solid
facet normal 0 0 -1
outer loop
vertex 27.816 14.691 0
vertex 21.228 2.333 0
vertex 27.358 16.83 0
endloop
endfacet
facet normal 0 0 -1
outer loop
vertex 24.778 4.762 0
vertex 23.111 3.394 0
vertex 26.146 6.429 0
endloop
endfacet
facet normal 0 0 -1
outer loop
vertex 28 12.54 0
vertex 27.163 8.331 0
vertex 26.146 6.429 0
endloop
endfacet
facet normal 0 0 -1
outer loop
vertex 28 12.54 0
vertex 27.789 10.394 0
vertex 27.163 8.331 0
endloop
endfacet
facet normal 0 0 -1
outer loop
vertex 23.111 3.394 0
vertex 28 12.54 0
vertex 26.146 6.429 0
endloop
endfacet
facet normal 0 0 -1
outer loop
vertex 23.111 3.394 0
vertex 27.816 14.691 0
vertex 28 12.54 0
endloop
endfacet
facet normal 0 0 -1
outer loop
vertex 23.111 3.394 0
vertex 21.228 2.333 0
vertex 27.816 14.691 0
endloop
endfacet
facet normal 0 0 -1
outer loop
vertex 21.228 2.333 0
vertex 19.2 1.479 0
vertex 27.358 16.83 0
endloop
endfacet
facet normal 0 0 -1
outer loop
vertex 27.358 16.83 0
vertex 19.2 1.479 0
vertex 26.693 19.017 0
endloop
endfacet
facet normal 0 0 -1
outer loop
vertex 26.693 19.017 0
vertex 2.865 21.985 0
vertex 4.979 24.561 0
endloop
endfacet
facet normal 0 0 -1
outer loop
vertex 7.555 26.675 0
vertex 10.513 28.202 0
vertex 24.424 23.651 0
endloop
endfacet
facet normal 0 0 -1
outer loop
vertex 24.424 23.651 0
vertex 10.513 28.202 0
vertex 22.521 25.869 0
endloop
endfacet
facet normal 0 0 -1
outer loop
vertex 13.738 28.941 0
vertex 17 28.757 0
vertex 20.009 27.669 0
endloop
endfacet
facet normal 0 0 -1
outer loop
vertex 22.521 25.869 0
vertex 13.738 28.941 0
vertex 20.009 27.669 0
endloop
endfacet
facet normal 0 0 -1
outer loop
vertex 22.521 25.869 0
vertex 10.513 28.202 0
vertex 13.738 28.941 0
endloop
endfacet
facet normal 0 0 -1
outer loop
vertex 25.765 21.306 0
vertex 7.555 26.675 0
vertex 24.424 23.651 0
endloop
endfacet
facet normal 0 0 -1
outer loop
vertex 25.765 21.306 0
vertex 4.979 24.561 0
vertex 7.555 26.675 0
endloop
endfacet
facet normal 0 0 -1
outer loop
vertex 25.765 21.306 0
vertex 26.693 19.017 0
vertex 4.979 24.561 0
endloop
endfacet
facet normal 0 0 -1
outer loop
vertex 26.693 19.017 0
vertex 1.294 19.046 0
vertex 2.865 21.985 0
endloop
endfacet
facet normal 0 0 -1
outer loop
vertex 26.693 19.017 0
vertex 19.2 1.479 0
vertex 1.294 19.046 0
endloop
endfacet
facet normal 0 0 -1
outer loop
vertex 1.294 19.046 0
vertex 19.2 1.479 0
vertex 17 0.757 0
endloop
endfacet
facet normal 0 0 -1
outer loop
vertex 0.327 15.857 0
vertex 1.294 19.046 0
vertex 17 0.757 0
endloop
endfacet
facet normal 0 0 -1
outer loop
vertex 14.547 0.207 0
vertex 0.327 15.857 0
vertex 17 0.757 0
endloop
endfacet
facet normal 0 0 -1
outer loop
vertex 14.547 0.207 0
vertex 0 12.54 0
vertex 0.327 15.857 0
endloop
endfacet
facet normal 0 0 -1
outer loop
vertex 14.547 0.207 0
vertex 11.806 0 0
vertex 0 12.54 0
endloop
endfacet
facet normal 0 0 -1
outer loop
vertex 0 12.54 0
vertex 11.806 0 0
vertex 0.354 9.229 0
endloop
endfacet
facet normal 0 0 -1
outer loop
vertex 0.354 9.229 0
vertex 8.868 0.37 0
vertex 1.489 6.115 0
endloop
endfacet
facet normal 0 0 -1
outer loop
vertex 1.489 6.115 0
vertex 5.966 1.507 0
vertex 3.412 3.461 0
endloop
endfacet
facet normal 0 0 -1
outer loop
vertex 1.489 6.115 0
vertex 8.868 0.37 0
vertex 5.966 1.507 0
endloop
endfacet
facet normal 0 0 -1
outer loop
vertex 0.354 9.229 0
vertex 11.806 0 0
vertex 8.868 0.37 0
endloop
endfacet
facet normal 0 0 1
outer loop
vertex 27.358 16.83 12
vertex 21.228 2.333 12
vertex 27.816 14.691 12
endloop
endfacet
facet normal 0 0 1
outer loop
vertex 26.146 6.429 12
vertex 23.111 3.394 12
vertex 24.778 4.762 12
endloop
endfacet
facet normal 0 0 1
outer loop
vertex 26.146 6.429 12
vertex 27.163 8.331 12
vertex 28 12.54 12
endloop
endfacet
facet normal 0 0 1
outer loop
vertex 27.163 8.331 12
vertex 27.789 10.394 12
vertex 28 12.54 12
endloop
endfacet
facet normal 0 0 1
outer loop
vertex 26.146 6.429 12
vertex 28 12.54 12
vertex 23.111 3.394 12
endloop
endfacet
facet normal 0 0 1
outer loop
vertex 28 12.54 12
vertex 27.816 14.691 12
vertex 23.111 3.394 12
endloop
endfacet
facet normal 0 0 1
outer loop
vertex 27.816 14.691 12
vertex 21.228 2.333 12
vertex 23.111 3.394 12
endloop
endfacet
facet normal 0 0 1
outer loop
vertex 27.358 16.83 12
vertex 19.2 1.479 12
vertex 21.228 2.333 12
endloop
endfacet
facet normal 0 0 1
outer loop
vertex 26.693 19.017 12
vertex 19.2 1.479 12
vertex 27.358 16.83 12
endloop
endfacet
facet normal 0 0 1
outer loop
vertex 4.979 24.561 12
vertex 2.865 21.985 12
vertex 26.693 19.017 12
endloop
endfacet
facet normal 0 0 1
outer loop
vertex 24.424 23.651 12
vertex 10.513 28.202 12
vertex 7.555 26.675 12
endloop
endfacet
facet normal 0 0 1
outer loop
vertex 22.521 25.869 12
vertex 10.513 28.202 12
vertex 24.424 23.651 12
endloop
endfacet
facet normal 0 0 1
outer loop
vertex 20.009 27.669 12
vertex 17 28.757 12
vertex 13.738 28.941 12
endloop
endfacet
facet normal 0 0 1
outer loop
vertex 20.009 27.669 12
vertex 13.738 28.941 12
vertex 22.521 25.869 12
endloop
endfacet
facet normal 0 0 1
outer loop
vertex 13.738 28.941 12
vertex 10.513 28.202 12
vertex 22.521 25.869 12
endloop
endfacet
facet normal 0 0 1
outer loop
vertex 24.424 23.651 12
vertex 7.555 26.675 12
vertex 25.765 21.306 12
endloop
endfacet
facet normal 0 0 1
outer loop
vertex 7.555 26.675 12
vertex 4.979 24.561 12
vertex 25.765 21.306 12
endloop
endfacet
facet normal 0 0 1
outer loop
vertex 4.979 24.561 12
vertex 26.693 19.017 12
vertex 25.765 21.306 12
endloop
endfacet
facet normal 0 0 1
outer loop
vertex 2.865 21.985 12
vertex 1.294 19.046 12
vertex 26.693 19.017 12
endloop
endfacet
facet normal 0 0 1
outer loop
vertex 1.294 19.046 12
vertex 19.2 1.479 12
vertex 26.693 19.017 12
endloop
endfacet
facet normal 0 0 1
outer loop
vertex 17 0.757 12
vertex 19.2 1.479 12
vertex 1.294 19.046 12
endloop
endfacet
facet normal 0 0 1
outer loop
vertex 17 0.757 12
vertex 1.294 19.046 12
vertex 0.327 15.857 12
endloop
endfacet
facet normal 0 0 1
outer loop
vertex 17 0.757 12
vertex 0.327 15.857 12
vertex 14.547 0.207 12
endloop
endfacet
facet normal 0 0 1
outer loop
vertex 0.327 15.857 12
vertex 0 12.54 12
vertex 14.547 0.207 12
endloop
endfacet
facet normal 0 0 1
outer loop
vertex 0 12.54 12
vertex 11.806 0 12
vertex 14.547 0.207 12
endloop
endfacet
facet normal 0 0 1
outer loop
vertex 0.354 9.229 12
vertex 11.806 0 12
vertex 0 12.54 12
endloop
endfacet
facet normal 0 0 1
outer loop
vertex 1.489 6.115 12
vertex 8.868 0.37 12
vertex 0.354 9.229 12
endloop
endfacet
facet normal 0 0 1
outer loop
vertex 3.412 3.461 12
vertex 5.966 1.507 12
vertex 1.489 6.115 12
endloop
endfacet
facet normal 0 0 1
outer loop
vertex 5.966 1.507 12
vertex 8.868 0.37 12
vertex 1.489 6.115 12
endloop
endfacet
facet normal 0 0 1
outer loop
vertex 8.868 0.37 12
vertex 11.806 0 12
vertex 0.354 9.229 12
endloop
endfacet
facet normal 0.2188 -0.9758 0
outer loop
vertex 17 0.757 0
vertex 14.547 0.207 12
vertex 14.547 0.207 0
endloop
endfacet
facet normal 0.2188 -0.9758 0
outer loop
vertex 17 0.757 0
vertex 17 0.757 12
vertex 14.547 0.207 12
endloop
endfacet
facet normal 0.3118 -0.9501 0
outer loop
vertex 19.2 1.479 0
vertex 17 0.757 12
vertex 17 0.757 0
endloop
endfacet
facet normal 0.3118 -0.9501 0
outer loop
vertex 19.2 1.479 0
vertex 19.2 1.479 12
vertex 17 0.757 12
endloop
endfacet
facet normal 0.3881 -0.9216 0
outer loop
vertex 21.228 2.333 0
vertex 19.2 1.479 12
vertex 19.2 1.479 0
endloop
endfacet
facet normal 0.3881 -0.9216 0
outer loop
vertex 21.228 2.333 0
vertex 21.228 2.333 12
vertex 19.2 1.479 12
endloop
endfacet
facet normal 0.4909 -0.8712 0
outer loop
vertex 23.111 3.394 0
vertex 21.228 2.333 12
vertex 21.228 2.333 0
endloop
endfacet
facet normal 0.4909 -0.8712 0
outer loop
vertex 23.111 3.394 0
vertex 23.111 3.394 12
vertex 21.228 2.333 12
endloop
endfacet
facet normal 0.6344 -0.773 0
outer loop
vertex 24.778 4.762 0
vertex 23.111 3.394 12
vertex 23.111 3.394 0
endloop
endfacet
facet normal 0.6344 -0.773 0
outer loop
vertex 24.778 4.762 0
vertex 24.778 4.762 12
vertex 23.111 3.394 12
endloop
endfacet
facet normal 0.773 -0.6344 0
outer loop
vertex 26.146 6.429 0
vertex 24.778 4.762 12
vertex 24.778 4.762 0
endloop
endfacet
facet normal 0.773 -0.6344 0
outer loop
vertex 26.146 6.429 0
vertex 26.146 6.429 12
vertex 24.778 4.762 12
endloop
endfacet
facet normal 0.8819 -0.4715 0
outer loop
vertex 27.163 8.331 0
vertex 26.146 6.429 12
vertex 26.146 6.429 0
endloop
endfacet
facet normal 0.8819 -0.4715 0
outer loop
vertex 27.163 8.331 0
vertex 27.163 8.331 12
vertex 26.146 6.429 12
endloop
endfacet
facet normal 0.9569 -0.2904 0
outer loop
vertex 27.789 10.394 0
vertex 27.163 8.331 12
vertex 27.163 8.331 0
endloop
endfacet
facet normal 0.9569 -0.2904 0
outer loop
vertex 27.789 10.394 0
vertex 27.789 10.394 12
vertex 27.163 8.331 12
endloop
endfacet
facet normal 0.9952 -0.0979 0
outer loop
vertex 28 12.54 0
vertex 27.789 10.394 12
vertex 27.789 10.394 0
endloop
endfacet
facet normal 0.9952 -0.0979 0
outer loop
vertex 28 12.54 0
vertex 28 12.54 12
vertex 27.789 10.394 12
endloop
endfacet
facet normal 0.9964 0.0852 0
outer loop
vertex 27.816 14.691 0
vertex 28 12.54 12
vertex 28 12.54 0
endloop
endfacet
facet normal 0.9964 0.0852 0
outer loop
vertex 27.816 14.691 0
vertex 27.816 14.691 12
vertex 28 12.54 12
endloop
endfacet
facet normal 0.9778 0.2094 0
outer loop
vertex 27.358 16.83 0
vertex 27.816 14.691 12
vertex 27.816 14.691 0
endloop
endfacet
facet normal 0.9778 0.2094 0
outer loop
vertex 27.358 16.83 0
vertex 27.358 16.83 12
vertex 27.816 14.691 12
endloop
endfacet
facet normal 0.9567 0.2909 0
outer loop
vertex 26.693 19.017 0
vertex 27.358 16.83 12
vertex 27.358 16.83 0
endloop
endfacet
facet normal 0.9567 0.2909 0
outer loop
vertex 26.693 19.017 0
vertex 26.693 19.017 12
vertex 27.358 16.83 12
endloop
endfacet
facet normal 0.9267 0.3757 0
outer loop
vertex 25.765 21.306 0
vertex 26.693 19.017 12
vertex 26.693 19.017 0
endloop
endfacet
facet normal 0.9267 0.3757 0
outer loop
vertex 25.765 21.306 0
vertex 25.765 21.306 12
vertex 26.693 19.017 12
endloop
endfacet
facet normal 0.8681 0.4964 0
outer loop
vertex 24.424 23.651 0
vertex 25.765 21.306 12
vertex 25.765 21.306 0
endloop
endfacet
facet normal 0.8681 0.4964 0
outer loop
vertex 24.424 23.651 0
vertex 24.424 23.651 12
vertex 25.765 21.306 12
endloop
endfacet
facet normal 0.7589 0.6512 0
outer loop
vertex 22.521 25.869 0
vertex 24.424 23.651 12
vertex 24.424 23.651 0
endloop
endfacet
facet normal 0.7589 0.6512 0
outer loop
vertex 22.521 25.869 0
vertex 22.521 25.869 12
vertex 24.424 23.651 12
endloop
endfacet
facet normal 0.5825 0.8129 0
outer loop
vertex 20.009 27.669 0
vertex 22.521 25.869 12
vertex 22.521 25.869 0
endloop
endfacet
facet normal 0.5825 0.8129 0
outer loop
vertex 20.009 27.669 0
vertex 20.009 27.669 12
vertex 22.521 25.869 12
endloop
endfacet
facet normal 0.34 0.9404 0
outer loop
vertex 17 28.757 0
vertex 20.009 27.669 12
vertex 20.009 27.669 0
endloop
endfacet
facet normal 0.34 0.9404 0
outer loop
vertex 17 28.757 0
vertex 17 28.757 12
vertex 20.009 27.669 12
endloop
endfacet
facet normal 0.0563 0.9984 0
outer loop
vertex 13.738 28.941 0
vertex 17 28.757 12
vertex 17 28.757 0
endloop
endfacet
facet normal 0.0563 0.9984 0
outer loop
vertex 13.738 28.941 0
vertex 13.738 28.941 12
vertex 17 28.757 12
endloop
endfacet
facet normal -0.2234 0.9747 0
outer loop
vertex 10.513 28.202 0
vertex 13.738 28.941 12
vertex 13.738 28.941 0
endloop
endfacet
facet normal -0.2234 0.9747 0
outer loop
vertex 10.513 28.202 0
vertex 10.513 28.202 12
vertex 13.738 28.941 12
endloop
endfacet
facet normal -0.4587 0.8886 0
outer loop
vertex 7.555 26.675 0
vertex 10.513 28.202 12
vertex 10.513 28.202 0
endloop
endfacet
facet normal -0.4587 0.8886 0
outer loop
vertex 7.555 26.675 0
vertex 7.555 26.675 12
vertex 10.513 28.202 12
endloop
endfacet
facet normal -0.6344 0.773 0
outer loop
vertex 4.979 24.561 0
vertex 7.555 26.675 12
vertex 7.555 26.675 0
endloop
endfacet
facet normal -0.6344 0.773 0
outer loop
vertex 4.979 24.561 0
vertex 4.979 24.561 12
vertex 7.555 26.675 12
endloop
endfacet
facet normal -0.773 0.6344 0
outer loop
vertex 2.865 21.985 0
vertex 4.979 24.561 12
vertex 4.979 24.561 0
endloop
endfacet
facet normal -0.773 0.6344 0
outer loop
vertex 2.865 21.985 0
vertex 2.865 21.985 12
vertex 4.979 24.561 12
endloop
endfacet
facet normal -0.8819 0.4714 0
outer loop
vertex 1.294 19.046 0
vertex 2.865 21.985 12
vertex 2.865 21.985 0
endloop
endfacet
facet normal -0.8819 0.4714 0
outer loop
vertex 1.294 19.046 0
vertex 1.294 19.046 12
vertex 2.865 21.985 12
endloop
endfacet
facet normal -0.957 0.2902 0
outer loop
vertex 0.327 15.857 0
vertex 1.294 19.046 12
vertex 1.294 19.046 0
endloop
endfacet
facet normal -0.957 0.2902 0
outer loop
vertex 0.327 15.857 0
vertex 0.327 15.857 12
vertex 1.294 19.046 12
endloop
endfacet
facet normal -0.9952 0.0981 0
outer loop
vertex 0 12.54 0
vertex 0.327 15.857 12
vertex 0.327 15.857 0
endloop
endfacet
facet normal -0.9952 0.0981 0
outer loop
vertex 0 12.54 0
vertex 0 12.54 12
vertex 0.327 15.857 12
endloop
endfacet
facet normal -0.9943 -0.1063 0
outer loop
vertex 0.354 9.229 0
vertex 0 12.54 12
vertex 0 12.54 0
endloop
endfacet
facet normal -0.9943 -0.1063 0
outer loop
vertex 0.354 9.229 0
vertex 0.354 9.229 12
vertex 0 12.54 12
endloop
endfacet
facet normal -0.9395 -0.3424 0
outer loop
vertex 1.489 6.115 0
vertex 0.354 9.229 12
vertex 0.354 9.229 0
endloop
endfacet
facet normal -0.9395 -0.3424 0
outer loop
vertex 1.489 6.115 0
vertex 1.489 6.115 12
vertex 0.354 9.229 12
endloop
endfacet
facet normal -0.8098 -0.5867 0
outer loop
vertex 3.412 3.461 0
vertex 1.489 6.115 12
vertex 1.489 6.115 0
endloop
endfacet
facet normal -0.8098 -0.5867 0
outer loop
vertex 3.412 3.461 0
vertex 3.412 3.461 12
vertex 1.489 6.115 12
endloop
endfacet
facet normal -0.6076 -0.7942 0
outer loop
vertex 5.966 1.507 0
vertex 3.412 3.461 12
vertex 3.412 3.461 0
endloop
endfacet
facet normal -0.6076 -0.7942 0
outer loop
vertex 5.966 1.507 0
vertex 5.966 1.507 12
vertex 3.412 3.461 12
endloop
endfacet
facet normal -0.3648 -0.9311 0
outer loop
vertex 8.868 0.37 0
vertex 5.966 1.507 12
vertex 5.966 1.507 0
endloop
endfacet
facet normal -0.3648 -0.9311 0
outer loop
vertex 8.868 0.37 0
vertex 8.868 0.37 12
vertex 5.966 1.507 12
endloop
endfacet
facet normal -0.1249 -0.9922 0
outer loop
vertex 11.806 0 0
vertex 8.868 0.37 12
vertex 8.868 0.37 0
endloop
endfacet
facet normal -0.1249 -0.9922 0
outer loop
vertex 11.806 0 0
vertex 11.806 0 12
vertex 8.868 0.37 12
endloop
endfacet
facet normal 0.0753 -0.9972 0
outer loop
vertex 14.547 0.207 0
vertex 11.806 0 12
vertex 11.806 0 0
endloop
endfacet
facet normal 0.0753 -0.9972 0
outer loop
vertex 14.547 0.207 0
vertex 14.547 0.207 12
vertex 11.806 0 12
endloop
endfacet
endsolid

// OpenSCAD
$fn = 32;

// ----------------------------------------------------------------------
// Cam disc: base radius 11.0 mm, lift 6.0 mm, 32 profile points
// ----------------------------------------------------------------------

// --- parameters (mm) ---
profile_height = 12;      // extrusion height
profile_points = 32;      // points of the closed outline

profile = [[28, 12.54], [27.816, 14.691], [27.358, 16.83], [26.693, 19.017], [25.765, 21.306], [24.424, 23.651], [22.521, 25.869], [20.009, 27.669], [17, 28.757], [13.738, 28.941], [10.513, 28.202], [7.555, 26.675], [4.979, 24.561], [2.865, 21.985], [1.294, 19.046], [0.327, 15.857], [0, 12.54], [0.354, 9.229], [1.489, 6.115], [3.412, 3.461], [5.966, 1.507], [8.868, 0.37], [11.806, 0], [14.547, 0.207], [17, 0.757], [19.2, 1.479], [21.228, 2.333], [23.111, 3.394], [24.778, 4.762], [26.146, 6.429], [27.163, 8.331], [27.789, 10.394]];  // single closed polygon, 32 points, counter clockwise

// --- the one profile operation ---
linear_extrude(height = profile_height) polygon(points = profile);
